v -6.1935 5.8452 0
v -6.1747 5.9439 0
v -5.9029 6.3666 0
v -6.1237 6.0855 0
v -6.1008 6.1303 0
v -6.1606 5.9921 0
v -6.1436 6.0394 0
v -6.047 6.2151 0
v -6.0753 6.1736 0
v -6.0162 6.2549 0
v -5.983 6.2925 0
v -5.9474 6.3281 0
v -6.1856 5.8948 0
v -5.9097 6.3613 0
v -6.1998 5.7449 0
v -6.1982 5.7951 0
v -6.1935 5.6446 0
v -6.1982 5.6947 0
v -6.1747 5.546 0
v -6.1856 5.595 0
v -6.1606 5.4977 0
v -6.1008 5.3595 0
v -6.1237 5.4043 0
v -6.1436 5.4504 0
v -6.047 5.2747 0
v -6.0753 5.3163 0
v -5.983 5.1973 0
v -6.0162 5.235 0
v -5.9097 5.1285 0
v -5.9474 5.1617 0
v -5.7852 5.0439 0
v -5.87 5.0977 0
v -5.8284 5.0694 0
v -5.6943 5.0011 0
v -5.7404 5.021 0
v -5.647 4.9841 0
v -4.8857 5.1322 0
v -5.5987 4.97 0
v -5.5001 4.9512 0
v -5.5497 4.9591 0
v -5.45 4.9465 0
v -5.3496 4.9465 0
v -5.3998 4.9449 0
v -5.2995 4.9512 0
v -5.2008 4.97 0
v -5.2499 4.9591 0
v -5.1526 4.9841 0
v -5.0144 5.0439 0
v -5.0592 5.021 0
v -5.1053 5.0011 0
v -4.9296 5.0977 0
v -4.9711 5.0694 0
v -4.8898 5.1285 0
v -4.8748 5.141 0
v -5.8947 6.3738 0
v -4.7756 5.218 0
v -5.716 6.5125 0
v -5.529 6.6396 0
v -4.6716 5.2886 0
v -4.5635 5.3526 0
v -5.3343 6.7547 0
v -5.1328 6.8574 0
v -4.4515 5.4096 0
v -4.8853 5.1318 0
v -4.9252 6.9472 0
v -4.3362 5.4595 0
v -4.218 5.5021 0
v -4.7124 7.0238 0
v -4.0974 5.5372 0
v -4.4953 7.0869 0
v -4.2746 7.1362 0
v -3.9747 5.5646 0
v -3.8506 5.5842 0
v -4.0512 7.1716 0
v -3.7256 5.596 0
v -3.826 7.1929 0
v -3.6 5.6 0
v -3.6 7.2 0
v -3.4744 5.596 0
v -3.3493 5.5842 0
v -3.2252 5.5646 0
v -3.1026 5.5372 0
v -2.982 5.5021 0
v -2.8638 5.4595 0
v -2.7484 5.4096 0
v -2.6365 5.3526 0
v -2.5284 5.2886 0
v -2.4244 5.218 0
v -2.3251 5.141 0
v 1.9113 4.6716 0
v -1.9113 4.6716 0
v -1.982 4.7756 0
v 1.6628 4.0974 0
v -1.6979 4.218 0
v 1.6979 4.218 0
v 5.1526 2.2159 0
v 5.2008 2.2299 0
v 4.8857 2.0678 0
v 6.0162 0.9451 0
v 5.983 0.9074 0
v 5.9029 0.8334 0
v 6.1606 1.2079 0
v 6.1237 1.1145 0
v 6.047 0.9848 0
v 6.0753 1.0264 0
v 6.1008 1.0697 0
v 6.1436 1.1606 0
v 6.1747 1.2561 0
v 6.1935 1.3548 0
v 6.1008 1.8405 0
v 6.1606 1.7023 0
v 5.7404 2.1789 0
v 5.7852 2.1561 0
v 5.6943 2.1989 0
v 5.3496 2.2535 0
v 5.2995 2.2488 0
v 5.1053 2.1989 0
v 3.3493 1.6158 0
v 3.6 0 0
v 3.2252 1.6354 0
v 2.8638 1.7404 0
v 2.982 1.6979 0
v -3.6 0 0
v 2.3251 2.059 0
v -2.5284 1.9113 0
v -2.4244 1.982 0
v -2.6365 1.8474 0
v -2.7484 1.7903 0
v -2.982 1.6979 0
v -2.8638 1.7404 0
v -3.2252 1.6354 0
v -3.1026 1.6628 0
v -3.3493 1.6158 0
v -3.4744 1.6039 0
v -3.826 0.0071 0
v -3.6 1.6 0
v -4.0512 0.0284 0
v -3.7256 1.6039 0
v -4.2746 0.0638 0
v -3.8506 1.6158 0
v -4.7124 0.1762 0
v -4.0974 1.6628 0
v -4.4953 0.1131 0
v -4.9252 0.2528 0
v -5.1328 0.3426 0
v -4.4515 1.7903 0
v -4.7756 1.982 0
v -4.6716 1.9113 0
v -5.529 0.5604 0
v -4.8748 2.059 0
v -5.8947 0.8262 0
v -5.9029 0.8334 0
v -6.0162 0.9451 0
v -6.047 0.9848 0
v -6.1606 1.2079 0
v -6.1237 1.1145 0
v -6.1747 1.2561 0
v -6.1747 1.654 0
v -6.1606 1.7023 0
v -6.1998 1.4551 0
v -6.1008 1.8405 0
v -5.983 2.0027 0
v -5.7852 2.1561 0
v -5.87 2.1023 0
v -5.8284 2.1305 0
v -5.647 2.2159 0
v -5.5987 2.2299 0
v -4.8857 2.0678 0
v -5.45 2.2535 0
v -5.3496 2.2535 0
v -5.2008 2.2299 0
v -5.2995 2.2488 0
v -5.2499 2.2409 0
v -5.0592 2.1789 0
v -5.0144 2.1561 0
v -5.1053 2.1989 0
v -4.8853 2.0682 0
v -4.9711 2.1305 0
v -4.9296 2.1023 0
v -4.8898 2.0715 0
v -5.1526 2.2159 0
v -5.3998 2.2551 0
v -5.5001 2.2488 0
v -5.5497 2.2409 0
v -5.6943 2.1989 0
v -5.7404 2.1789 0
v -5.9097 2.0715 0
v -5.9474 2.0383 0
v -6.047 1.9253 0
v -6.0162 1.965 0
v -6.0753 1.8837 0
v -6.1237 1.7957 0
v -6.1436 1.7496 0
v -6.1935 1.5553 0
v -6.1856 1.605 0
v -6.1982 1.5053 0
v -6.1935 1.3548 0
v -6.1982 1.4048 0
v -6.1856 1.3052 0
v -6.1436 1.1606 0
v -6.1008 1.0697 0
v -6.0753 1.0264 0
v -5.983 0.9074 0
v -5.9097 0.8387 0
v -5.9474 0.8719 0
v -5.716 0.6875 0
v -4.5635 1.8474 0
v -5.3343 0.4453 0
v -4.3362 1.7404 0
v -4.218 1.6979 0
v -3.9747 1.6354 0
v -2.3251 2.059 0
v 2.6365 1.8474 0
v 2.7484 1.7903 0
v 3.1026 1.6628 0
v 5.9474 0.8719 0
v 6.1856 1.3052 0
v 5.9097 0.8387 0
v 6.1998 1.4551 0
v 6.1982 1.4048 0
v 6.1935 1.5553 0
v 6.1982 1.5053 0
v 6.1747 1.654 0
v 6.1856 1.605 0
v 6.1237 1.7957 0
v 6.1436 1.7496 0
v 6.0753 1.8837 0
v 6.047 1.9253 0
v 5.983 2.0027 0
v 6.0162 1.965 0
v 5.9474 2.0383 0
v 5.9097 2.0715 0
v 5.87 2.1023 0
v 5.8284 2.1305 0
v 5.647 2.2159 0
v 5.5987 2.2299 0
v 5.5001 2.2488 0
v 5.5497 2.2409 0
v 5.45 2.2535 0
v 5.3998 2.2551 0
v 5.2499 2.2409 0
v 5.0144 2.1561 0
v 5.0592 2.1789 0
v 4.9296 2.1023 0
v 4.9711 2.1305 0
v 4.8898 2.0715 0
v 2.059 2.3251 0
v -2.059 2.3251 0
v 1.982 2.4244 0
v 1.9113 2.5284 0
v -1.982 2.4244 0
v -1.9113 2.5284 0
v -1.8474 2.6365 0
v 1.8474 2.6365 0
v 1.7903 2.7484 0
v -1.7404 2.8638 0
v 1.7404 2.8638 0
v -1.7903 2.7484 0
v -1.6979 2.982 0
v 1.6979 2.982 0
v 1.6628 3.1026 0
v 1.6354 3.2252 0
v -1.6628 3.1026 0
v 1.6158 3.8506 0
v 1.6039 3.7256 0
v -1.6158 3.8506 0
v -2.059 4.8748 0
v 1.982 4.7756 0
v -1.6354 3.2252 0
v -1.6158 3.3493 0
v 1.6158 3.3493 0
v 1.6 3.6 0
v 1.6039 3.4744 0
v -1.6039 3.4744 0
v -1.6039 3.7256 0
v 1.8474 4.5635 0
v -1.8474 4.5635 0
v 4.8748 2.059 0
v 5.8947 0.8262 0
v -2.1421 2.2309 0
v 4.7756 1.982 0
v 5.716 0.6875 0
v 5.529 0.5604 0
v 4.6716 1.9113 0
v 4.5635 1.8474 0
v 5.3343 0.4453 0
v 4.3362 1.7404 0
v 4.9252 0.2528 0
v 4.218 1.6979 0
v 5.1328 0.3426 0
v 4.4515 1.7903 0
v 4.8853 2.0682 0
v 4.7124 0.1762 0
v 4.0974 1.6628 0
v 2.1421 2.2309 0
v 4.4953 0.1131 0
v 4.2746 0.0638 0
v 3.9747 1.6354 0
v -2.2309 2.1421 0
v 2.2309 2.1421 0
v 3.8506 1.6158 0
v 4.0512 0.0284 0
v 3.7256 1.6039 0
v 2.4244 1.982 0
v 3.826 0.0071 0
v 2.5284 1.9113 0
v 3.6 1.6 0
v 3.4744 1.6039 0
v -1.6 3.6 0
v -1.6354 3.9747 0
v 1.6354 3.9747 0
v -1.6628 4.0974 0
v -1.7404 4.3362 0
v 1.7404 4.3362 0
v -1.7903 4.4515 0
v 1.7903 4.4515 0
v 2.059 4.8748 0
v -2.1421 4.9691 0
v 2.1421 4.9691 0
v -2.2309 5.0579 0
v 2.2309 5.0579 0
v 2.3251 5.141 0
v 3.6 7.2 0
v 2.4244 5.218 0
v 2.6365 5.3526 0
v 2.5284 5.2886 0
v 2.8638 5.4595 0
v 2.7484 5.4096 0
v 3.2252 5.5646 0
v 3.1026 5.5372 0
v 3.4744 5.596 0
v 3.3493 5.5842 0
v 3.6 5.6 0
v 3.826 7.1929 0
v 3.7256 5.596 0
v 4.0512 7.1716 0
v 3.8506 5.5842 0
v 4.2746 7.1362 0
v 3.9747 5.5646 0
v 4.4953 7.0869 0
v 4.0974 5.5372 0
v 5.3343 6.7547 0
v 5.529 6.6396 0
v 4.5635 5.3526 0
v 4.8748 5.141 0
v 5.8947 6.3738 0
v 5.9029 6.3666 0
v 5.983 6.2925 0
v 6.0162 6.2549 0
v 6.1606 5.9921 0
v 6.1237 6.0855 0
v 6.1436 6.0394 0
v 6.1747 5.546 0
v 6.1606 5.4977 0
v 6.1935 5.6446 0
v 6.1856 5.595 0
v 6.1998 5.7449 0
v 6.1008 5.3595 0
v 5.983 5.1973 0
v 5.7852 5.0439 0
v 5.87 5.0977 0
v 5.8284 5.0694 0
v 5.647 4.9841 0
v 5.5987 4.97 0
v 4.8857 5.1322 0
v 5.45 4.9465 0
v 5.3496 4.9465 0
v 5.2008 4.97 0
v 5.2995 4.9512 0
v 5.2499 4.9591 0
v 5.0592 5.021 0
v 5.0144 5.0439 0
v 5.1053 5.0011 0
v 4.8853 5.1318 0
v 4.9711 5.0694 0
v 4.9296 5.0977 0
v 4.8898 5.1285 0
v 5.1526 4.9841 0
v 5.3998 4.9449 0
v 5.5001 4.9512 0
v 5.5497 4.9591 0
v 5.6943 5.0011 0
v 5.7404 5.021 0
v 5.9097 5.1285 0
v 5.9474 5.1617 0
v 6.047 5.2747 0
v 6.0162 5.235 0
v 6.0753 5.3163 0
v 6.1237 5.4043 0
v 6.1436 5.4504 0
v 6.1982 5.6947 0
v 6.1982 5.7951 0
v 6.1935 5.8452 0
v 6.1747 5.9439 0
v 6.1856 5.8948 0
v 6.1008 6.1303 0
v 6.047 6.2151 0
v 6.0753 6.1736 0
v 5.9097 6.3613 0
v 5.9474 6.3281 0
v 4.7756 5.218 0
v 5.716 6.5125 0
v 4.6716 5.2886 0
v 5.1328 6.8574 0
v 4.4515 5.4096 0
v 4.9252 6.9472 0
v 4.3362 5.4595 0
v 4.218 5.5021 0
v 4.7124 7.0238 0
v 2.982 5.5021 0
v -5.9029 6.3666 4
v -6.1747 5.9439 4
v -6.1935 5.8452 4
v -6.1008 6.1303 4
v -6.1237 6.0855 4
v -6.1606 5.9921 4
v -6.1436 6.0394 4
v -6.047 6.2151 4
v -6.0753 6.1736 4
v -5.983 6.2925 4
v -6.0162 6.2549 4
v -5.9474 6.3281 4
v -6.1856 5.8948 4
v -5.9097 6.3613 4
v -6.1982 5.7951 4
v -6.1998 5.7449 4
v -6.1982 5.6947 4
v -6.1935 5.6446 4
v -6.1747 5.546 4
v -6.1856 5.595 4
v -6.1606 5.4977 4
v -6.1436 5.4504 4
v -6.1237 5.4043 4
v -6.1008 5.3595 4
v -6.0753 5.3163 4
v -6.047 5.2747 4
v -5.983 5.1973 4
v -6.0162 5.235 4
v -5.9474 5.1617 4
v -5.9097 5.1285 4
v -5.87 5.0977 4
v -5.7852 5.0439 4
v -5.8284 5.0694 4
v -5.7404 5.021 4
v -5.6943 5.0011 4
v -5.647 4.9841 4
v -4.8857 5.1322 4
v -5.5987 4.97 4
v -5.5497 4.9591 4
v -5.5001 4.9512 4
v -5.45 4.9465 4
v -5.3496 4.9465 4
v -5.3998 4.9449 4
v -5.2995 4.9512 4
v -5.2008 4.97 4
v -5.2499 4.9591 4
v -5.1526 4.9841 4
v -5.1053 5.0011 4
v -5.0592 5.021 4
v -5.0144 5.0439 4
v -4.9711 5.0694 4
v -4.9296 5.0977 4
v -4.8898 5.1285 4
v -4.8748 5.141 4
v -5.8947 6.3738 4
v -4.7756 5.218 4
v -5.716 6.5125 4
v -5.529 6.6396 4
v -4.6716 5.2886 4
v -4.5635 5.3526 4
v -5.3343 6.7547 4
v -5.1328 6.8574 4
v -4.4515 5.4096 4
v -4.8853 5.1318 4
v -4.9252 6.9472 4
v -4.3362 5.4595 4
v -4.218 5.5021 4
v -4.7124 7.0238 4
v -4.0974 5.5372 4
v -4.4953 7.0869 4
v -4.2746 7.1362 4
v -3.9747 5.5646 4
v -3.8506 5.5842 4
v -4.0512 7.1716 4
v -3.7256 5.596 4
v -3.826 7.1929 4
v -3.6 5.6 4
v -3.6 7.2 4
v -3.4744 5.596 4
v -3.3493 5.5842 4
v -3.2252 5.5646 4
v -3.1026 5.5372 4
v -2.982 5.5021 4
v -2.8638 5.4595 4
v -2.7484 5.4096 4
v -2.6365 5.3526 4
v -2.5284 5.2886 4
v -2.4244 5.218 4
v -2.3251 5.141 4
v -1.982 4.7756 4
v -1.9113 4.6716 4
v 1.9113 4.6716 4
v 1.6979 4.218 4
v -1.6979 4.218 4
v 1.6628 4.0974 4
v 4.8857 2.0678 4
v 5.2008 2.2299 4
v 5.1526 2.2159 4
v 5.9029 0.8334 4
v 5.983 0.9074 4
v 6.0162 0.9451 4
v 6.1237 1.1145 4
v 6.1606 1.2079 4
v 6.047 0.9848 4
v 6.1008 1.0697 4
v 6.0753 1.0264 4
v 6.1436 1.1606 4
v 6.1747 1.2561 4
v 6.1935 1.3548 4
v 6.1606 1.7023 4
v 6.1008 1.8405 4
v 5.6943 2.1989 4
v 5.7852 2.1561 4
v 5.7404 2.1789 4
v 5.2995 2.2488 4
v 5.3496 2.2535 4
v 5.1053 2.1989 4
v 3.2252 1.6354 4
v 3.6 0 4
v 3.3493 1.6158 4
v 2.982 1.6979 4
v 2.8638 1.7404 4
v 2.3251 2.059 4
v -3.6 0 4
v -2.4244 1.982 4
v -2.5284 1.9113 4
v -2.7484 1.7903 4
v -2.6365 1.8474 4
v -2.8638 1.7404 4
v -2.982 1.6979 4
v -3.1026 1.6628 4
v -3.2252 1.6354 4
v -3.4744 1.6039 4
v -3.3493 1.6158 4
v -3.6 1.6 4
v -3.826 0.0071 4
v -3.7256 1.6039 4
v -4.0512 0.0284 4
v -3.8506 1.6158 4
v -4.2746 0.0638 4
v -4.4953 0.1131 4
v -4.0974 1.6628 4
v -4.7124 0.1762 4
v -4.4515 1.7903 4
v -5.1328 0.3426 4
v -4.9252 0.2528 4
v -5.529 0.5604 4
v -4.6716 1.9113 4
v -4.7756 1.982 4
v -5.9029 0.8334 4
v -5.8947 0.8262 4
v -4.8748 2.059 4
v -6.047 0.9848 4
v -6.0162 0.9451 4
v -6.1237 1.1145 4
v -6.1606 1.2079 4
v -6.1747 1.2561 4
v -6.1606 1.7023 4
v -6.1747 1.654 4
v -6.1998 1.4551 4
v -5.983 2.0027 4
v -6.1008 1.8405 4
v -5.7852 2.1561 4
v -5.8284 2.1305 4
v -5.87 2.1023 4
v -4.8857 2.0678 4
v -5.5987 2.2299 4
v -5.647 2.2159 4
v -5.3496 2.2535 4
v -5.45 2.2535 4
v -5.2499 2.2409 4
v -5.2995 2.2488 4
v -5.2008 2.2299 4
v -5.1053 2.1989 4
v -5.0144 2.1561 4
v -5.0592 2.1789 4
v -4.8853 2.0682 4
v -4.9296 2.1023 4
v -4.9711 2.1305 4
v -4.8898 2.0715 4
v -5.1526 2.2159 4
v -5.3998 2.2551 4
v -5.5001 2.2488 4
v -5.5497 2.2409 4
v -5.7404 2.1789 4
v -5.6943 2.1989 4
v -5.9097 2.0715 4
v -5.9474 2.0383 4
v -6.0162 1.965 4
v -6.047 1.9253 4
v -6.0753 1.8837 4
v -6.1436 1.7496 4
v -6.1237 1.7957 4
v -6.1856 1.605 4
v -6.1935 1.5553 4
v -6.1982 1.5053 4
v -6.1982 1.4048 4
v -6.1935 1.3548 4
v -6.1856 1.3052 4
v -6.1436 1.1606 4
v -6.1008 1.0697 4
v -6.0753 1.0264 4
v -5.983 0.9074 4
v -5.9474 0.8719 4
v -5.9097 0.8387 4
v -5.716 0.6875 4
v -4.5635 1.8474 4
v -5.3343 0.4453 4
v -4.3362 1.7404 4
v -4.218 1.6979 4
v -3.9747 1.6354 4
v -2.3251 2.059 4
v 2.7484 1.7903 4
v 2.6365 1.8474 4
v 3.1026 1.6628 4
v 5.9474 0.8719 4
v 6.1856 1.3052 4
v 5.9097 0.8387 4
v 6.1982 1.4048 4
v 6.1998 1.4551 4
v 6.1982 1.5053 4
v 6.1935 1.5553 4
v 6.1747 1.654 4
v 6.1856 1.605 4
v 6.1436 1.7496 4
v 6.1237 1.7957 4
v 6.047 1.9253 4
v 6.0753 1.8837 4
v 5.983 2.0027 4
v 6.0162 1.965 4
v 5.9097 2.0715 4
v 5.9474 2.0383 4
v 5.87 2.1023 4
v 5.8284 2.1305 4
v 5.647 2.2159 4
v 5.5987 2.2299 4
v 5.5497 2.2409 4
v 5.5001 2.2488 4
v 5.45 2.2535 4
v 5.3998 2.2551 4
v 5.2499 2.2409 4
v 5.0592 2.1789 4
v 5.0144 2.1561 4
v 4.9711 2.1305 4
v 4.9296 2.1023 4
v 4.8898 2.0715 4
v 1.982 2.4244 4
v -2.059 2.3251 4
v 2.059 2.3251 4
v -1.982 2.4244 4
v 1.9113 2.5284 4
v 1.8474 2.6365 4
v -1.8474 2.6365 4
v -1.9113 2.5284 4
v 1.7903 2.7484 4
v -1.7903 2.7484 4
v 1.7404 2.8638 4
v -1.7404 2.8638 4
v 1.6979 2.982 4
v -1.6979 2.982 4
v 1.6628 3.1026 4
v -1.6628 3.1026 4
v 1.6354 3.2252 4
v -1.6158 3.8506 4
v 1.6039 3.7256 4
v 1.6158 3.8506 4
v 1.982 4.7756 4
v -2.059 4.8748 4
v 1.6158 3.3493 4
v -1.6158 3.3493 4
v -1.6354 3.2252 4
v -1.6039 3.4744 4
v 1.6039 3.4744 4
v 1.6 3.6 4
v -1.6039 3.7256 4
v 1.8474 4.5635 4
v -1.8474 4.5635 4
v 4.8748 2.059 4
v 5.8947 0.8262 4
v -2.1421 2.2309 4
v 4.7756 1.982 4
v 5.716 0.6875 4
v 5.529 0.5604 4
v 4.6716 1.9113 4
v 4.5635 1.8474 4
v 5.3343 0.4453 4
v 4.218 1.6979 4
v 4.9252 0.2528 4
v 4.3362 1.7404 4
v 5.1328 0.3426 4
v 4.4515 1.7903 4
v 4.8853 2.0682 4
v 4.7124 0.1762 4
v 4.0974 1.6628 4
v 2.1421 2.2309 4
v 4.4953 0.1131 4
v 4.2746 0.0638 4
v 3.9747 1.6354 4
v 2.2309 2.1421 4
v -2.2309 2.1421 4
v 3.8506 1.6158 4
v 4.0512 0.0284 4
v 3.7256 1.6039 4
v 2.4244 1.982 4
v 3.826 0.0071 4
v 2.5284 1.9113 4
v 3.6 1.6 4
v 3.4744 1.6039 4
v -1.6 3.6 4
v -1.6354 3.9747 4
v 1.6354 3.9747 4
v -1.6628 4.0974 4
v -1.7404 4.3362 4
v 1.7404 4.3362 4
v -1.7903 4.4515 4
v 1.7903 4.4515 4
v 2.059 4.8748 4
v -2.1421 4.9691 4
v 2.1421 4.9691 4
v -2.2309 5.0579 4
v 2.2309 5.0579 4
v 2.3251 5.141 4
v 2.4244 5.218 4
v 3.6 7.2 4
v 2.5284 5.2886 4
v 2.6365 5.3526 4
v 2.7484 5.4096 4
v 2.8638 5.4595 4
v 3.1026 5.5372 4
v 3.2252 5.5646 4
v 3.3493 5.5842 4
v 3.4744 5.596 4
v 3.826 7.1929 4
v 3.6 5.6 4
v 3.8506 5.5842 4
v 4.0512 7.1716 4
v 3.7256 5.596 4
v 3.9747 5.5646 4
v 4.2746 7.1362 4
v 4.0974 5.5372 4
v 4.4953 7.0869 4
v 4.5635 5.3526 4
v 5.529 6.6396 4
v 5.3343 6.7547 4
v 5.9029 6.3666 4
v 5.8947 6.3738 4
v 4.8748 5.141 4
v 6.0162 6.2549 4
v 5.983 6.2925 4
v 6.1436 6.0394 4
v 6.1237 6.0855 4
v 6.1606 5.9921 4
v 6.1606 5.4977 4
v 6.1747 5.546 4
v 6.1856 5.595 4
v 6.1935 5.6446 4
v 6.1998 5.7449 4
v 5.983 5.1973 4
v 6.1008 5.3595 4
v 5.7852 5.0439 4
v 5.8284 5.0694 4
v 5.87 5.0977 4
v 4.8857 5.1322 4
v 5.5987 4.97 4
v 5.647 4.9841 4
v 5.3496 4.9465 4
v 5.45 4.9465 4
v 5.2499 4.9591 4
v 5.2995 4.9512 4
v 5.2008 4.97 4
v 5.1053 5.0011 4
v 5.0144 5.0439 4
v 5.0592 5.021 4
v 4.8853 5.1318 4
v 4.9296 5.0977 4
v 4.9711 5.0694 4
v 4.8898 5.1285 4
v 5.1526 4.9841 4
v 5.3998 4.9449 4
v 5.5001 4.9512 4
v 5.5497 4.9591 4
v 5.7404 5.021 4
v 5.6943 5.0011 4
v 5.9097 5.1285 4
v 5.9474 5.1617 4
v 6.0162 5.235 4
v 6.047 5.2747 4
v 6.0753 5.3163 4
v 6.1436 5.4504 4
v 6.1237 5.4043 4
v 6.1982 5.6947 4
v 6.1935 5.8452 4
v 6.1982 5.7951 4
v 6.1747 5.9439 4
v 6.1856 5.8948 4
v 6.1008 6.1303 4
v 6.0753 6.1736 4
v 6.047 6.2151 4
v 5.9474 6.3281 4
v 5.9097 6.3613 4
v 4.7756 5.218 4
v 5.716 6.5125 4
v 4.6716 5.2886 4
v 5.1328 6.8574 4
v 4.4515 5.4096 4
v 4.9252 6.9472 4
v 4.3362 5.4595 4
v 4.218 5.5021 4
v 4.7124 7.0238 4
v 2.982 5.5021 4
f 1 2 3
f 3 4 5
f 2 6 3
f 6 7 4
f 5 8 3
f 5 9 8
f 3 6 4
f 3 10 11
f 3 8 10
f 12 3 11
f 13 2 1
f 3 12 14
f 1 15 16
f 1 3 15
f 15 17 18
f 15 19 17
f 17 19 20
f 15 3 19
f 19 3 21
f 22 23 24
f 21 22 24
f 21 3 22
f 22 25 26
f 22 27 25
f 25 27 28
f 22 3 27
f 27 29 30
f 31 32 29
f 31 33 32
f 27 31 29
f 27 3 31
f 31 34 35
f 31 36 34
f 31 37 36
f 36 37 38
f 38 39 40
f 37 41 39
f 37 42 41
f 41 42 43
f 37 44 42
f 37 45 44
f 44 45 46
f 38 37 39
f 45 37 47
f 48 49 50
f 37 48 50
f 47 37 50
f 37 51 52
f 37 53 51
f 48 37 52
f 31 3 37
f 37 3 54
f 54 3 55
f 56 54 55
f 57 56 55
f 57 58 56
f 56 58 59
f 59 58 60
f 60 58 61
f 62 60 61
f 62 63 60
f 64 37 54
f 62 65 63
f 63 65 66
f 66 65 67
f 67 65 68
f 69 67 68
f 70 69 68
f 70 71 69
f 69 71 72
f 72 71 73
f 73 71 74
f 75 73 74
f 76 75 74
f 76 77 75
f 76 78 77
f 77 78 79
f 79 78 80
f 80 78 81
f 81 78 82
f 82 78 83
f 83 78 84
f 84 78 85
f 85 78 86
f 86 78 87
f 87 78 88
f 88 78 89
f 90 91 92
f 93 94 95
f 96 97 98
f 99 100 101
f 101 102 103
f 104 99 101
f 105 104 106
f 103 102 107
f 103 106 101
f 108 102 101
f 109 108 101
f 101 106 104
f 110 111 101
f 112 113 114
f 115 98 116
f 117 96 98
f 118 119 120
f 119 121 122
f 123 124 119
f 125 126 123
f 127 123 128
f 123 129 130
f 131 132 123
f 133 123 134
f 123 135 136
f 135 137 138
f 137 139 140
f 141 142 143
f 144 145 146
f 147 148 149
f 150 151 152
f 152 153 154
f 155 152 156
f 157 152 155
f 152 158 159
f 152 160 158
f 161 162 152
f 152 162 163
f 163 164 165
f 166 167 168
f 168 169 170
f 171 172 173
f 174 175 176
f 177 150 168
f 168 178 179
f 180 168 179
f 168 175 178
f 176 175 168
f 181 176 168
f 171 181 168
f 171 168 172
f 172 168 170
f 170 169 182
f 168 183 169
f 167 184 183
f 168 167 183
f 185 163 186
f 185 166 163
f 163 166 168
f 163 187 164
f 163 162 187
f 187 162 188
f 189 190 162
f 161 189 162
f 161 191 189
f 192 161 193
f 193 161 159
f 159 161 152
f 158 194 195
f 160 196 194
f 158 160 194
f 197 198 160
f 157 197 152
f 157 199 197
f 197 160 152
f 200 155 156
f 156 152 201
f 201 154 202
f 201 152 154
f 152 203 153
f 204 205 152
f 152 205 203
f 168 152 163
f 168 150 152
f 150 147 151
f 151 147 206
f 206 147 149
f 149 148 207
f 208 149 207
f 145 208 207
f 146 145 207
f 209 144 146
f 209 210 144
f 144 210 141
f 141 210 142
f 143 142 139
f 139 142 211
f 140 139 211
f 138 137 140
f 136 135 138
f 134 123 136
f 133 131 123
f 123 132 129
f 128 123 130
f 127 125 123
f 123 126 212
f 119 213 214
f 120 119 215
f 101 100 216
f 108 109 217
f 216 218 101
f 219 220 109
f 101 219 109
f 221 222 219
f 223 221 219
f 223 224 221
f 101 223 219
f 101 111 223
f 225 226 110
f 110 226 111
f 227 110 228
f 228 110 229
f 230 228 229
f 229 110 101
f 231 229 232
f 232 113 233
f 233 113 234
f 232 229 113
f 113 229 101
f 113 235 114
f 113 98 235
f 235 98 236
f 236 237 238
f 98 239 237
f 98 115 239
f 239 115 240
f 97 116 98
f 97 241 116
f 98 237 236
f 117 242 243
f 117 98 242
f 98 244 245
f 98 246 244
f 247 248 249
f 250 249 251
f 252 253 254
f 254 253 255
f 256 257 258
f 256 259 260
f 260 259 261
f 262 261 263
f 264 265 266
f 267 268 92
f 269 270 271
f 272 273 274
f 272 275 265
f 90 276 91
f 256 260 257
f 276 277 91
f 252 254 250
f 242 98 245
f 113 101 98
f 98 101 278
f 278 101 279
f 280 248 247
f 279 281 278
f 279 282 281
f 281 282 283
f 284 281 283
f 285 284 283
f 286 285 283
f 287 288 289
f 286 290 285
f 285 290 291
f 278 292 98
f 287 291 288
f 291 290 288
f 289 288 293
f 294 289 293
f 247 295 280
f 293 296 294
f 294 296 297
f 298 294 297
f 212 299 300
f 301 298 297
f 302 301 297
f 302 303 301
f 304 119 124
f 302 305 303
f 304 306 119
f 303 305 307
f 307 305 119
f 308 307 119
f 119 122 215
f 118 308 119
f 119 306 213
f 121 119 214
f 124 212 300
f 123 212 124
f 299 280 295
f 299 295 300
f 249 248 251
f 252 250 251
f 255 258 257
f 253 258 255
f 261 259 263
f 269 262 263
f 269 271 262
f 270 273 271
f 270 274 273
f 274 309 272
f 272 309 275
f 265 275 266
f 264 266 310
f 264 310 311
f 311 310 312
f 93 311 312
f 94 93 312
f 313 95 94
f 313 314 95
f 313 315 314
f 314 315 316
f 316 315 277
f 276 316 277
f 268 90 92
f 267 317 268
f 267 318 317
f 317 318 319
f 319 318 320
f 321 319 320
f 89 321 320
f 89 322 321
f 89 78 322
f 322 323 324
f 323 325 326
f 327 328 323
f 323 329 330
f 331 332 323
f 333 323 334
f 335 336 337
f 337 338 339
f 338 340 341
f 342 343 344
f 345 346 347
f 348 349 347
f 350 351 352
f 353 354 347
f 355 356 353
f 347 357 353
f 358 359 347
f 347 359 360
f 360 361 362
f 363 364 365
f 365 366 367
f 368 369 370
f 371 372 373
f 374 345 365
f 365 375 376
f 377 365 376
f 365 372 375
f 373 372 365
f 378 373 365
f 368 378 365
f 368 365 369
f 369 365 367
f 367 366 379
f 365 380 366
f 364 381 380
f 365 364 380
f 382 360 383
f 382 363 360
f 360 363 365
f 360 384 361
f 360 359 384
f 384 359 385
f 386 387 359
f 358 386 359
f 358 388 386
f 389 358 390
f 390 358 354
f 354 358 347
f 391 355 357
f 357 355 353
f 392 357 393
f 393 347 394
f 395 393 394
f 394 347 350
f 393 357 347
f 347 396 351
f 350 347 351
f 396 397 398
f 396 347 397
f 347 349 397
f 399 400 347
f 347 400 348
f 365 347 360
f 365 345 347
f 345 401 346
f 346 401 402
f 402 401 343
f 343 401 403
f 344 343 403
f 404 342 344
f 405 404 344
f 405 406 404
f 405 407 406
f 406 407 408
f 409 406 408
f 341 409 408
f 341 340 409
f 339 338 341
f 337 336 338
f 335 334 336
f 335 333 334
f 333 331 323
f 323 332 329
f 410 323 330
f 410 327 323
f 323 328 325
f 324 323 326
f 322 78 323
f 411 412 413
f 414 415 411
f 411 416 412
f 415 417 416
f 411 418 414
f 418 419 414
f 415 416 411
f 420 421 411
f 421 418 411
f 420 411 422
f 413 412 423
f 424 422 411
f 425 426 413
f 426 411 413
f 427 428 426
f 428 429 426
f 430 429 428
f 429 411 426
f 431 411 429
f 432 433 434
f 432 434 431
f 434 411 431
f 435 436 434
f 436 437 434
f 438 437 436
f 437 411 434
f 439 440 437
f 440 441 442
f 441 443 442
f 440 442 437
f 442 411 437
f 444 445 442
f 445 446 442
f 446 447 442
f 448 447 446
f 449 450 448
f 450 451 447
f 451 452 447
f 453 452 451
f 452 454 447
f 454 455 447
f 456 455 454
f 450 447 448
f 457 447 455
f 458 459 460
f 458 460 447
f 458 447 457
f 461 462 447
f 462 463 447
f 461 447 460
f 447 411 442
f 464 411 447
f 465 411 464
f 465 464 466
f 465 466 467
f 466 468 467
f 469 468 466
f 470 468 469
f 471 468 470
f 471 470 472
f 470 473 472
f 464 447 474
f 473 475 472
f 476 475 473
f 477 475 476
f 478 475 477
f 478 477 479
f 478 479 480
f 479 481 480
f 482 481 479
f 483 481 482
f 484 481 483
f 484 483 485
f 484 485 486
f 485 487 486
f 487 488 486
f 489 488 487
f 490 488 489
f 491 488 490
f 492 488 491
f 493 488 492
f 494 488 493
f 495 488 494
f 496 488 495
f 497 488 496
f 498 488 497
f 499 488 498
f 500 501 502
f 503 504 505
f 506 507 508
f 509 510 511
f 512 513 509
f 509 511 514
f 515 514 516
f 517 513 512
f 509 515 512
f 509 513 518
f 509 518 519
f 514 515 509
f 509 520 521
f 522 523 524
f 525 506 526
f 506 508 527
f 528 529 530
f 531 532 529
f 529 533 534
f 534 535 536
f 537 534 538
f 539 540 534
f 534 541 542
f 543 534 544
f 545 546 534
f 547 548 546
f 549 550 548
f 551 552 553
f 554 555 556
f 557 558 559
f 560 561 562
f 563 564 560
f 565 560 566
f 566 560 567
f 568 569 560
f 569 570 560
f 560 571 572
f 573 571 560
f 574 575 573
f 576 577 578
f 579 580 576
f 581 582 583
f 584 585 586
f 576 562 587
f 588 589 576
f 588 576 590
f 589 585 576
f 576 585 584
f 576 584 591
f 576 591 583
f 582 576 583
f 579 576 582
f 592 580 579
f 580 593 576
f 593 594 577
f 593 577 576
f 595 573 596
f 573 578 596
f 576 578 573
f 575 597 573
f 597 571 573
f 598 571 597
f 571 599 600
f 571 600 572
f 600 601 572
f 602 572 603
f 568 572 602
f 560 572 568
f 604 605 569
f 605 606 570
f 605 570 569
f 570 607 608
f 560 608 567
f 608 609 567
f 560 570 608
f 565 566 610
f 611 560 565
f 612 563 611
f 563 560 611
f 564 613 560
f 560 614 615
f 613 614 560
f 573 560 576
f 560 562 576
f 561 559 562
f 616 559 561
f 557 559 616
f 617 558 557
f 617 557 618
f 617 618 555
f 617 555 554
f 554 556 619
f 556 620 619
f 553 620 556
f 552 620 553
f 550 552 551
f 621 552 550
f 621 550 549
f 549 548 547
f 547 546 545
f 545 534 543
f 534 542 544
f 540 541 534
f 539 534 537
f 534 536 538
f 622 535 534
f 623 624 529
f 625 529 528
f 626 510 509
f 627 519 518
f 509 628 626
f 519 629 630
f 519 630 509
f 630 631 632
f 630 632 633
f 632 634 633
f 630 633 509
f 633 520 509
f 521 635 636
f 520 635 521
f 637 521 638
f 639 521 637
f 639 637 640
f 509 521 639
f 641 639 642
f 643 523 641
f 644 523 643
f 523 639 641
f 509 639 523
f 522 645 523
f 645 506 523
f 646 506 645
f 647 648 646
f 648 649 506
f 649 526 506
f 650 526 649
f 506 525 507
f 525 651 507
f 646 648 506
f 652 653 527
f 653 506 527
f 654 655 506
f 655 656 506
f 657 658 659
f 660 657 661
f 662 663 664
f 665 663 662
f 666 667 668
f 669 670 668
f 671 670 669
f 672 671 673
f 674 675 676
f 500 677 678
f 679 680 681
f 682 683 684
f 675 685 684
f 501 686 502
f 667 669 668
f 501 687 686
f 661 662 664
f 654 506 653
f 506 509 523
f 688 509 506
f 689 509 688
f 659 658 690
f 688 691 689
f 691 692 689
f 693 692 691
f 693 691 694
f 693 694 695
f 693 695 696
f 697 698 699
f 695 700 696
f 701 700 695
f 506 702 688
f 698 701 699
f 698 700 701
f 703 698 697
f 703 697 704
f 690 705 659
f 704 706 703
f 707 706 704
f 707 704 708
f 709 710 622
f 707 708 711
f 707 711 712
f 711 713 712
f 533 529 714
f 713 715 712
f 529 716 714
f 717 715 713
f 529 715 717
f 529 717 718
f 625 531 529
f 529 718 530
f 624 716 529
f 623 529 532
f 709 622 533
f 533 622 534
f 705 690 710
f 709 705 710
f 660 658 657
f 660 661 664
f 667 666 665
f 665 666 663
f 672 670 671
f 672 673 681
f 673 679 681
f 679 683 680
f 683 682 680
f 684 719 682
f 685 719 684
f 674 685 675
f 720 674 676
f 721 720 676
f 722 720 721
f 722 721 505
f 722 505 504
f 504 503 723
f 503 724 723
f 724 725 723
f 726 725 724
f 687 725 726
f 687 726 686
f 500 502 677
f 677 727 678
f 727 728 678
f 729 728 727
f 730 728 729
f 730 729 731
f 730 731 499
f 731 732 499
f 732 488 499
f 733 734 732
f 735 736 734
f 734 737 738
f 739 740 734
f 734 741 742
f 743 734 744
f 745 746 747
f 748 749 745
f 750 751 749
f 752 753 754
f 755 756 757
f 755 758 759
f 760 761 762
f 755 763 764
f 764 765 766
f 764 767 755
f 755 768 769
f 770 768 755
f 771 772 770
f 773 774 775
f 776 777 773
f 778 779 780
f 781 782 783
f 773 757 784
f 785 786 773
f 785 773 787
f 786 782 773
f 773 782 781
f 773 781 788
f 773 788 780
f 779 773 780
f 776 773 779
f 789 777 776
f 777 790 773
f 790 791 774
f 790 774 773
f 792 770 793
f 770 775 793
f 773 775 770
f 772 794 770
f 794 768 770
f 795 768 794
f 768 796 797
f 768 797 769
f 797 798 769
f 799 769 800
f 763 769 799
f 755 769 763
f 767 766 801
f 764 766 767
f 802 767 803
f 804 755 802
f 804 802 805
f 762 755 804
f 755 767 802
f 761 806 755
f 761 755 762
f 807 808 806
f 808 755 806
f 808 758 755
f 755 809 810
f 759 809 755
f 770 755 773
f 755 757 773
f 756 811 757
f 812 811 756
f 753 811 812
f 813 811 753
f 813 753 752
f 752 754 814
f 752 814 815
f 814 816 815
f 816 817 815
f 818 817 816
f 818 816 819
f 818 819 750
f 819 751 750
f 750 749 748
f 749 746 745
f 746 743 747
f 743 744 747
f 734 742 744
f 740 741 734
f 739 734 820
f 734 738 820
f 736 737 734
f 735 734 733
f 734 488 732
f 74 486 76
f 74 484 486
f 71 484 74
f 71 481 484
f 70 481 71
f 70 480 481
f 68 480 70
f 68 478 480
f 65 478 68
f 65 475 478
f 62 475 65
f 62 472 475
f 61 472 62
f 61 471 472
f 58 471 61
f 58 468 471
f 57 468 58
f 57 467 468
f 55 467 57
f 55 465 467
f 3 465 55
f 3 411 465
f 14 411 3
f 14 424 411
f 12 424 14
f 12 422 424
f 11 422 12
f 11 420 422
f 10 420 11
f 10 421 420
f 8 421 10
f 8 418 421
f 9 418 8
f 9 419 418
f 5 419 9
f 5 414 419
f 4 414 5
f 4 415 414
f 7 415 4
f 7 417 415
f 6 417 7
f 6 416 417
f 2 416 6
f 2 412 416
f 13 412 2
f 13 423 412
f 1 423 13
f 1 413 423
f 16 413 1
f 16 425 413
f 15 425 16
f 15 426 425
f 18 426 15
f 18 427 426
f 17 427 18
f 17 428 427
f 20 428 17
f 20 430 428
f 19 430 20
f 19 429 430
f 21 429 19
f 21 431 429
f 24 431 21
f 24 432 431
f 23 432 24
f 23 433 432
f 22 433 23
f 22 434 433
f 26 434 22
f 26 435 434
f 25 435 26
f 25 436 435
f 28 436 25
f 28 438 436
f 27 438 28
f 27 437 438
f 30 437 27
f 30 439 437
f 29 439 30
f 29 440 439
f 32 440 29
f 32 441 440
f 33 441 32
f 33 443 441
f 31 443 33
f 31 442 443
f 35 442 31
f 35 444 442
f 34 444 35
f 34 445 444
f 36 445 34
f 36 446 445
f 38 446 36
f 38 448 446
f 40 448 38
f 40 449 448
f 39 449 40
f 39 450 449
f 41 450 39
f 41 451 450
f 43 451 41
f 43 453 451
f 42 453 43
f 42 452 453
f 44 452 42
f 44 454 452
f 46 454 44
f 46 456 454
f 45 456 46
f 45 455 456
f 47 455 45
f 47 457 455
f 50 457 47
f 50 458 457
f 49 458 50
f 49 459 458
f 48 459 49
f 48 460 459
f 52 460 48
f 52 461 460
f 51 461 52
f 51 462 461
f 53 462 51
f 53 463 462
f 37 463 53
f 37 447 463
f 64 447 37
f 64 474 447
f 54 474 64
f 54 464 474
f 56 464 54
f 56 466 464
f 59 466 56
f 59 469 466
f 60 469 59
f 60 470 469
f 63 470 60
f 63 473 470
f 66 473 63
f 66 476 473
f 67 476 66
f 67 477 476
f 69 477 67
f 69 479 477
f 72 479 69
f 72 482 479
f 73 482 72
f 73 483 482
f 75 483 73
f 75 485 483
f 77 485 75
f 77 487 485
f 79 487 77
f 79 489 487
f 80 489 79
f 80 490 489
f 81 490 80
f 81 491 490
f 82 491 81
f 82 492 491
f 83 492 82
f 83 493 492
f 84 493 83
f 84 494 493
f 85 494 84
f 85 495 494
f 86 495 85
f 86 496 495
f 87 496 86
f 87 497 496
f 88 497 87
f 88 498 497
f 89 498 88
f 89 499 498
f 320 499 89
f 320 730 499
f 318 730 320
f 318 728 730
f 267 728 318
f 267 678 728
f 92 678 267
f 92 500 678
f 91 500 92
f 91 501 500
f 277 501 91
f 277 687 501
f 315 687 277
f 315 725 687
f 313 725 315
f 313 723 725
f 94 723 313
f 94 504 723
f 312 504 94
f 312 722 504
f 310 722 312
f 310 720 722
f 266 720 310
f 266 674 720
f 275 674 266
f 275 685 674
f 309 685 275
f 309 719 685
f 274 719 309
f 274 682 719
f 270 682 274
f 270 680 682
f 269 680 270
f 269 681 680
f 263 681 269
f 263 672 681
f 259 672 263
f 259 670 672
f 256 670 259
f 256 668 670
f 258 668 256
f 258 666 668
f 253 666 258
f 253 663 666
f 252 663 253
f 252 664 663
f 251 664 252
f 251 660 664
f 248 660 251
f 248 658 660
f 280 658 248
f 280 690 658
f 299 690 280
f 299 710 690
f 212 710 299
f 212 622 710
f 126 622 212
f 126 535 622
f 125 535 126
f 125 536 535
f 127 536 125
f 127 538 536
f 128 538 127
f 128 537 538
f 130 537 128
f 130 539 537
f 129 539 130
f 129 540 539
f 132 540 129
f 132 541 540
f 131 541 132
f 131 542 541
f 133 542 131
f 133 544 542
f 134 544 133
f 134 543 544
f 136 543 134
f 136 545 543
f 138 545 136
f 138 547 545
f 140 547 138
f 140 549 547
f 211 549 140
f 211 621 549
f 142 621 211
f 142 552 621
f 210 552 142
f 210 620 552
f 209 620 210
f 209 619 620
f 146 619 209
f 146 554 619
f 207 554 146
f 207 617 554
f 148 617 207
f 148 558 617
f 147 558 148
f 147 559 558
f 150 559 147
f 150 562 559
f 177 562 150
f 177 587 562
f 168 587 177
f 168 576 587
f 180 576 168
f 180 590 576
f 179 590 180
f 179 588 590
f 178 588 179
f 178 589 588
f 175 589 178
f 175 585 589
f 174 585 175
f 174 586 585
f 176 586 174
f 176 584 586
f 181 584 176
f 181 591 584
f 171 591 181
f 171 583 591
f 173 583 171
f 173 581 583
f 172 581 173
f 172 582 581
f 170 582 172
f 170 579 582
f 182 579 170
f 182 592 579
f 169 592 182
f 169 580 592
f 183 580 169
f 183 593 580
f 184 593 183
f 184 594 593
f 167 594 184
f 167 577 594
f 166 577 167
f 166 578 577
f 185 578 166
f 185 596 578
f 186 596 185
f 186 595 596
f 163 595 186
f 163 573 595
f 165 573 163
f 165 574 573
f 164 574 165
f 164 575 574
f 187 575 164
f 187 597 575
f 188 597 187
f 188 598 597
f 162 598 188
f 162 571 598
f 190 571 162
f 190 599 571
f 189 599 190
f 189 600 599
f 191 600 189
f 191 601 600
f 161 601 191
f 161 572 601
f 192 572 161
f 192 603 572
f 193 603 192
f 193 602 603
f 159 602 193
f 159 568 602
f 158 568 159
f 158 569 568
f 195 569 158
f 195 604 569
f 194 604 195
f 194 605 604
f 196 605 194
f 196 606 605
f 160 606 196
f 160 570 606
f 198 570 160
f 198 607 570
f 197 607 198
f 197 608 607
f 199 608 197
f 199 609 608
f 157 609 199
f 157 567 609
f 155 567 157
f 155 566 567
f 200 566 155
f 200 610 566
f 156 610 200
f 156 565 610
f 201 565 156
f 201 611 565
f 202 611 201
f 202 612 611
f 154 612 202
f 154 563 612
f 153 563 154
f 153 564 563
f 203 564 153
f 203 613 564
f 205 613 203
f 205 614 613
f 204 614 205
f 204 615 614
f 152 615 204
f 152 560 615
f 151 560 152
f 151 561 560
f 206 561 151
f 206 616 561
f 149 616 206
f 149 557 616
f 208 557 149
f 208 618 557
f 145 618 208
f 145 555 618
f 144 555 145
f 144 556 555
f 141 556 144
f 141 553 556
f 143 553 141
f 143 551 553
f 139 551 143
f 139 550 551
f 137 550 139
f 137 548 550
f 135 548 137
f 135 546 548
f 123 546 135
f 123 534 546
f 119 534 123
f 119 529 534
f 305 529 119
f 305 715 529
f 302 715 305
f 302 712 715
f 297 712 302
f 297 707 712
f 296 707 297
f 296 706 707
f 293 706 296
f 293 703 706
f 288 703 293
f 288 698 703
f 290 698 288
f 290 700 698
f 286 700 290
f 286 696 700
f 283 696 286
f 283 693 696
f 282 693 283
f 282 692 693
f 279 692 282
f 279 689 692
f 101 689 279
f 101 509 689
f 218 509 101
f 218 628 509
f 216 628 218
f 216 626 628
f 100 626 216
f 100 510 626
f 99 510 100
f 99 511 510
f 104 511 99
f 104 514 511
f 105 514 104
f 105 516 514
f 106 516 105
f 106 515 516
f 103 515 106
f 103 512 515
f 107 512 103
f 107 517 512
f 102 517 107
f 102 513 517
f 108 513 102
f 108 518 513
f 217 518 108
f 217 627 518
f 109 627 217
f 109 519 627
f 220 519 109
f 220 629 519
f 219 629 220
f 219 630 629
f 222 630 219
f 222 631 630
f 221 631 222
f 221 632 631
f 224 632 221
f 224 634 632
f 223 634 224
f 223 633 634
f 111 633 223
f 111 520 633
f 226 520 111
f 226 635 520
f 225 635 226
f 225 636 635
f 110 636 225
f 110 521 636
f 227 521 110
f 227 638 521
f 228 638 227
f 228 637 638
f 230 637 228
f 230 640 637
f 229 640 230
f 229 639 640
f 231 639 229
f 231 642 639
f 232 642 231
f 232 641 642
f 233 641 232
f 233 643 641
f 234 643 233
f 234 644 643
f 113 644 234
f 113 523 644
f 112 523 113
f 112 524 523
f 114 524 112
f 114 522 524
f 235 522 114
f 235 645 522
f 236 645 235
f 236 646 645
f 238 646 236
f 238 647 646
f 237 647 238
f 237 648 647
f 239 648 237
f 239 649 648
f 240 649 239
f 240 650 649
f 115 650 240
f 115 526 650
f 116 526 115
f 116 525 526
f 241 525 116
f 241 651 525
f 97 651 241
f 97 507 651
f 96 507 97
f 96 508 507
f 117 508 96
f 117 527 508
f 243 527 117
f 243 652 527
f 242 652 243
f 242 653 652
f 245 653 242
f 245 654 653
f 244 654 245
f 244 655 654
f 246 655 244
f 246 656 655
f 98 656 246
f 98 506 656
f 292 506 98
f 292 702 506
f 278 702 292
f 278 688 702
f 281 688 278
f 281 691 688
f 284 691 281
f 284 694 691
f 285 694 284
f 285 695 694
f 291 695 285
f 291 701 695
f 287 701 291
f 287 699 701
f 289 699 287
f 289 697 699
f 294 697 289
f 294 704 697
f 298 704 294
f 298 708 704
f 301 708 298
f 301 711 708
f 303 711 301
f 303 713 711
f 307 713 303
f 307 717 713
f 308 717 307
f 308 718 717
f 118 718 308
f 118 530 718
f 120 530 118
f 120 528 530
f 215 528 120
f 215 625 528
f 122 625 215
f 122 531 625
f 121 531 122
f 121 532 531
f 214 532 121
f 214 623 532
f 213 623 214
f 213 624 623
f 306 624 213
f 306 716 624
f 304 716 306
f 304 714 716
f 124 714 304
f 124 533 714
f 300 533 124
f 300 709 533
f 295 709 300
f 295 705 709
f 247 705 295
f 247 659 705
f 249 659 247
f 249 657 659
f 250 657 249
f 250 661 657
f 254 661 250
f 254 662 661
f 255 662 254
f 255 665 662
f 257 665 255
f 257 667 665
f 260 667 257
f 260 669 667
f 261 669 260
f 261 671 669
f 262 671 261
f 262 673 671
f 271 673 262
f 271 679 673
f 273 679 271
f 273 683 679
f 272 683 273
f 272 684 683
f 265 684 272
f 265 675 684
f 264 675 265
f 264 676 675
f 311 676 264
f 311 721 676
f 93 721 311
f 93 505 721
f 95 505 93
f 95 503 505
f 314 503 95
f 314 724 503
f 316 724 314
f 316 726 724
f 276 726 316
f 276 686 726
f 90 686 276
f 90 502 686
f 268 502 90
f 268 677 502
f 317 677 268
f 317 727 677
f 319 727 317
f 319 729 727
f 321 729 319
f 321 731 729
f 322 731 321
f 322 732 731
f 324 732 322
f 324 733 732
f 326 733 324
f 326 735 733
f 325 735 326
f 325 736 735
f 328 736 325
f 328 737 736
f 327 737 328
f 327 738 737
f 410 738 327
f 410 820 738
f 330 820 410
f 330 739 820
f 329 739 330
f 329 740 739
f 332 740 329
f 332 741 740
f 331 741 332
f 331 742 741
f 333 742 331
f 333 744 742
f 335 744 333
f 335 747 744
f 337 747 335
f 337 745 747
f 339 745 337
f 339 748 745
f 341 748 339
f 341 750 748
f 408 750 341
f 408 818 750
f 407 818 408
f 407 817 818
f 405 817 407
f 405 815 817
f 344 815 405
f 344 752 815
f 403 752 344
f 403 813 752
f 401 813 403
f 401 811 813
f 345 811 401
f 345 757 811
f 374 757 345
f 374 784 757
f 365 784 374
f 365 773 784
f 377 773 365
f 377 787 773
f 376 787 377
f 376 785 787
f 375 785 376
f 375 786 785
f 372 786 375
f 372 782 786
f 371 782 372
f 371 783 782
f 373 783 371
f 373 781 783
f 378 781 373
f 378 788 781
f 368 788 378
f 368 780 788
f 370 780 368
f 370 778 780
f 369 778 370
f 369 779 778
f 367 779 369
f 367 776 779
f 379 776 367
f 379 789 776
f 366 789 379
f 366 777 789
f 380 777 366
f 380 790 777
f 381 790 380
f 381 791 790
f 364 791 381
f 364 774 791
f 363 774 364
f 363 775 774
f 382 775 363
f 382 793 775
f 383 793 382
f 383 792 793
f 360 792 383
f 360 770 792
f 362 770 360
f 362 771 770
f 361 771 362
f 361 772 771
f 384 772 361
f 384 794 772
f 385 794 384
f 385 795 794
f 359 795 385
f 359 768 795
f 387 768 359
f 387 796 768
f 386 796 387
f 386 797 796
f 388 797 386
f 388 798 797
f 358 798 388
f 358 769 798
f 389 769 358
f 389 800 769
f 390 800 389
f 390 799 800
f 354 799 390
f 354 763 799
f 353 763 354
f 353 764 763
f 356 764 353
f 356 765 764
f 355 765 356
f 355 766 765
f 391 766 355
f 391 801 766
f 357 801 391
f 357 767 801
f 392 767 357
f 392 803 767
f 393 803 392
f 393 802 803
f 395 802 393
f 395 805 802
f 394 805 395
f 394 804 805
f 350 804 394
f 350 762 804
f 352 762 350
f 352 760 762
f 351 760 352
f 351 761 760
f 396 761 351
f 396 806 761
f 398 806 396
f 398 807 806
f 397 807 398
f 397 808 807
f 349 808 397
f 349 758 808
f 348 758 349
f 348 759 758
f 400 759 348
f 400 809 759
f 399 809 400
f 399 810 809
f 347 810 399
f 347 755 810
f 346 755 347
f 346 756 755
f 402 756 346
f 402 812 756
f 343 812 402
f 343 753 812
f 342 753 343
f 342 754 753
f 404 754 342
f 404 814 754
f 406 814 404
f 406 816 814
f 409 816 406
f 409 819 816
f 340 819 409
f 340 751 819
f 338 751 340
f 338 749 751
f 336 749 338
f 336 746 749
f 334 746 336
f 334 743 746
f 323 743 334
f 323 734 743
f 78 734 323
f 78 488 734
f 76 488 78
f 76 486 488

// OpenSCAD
// cable diameter
cable = 4;
// number of cable pairs for holder
rows = 1;
// wall thikness */
thik  = 1.6;
// size of opening for cable
angel = 50; // [90]

/*******************************************************************************/
/* [Hidden] */
$fn=100;

outer = cable + 2*thik;
clips(rows);

/* rows of dual clips */
module clips(num) {
    linear_extrude(height=4) {
	for(idx=[0 : 1 : num-1  ]) {
	    translate([0, outer * idx])
	    dual();
	}
    }
}

/* dual clip, centred */
module dual() {
    copy_mirror()
    translate([outer/2, outer/2])
    clip(cable, outer, angel);
}

/* single clip, centered */
module clip(cable, outer, angel) {
    difference() {
	union() {
	    /* fill in the middle */
	    translate([-outer/2,0])
	    square(outer/2);
	    translate([-outer/2,-outer/2])
	    square(outer/2);

	    /* outer circle */
	    circle(d=outer);
	}
	/* remove cable circle */
	circle(d=cable);
	polygon(points=[[0,0],[ outer/2, tan(angel)*outer/2],[outer/2,-tan(angel)*outer/2]]);
    }
    /* Add rouded edge */
    hyp = ((outer-cable)/2 + cable)/2;

    translate([ cos(angel)*hyp , sin(angel)*hyp])
    circle(d=(outer-cable)/2);
    translate([ cos(angel)*hyp , -sin(angel)*hyp])
    circle(d=(outer-cable)/2);
}


/******************************************************************************/
/* generic helpers */

module copy_mirror(vec=[1,0,0]) {
    children();
    mirror(vec) children();
}
